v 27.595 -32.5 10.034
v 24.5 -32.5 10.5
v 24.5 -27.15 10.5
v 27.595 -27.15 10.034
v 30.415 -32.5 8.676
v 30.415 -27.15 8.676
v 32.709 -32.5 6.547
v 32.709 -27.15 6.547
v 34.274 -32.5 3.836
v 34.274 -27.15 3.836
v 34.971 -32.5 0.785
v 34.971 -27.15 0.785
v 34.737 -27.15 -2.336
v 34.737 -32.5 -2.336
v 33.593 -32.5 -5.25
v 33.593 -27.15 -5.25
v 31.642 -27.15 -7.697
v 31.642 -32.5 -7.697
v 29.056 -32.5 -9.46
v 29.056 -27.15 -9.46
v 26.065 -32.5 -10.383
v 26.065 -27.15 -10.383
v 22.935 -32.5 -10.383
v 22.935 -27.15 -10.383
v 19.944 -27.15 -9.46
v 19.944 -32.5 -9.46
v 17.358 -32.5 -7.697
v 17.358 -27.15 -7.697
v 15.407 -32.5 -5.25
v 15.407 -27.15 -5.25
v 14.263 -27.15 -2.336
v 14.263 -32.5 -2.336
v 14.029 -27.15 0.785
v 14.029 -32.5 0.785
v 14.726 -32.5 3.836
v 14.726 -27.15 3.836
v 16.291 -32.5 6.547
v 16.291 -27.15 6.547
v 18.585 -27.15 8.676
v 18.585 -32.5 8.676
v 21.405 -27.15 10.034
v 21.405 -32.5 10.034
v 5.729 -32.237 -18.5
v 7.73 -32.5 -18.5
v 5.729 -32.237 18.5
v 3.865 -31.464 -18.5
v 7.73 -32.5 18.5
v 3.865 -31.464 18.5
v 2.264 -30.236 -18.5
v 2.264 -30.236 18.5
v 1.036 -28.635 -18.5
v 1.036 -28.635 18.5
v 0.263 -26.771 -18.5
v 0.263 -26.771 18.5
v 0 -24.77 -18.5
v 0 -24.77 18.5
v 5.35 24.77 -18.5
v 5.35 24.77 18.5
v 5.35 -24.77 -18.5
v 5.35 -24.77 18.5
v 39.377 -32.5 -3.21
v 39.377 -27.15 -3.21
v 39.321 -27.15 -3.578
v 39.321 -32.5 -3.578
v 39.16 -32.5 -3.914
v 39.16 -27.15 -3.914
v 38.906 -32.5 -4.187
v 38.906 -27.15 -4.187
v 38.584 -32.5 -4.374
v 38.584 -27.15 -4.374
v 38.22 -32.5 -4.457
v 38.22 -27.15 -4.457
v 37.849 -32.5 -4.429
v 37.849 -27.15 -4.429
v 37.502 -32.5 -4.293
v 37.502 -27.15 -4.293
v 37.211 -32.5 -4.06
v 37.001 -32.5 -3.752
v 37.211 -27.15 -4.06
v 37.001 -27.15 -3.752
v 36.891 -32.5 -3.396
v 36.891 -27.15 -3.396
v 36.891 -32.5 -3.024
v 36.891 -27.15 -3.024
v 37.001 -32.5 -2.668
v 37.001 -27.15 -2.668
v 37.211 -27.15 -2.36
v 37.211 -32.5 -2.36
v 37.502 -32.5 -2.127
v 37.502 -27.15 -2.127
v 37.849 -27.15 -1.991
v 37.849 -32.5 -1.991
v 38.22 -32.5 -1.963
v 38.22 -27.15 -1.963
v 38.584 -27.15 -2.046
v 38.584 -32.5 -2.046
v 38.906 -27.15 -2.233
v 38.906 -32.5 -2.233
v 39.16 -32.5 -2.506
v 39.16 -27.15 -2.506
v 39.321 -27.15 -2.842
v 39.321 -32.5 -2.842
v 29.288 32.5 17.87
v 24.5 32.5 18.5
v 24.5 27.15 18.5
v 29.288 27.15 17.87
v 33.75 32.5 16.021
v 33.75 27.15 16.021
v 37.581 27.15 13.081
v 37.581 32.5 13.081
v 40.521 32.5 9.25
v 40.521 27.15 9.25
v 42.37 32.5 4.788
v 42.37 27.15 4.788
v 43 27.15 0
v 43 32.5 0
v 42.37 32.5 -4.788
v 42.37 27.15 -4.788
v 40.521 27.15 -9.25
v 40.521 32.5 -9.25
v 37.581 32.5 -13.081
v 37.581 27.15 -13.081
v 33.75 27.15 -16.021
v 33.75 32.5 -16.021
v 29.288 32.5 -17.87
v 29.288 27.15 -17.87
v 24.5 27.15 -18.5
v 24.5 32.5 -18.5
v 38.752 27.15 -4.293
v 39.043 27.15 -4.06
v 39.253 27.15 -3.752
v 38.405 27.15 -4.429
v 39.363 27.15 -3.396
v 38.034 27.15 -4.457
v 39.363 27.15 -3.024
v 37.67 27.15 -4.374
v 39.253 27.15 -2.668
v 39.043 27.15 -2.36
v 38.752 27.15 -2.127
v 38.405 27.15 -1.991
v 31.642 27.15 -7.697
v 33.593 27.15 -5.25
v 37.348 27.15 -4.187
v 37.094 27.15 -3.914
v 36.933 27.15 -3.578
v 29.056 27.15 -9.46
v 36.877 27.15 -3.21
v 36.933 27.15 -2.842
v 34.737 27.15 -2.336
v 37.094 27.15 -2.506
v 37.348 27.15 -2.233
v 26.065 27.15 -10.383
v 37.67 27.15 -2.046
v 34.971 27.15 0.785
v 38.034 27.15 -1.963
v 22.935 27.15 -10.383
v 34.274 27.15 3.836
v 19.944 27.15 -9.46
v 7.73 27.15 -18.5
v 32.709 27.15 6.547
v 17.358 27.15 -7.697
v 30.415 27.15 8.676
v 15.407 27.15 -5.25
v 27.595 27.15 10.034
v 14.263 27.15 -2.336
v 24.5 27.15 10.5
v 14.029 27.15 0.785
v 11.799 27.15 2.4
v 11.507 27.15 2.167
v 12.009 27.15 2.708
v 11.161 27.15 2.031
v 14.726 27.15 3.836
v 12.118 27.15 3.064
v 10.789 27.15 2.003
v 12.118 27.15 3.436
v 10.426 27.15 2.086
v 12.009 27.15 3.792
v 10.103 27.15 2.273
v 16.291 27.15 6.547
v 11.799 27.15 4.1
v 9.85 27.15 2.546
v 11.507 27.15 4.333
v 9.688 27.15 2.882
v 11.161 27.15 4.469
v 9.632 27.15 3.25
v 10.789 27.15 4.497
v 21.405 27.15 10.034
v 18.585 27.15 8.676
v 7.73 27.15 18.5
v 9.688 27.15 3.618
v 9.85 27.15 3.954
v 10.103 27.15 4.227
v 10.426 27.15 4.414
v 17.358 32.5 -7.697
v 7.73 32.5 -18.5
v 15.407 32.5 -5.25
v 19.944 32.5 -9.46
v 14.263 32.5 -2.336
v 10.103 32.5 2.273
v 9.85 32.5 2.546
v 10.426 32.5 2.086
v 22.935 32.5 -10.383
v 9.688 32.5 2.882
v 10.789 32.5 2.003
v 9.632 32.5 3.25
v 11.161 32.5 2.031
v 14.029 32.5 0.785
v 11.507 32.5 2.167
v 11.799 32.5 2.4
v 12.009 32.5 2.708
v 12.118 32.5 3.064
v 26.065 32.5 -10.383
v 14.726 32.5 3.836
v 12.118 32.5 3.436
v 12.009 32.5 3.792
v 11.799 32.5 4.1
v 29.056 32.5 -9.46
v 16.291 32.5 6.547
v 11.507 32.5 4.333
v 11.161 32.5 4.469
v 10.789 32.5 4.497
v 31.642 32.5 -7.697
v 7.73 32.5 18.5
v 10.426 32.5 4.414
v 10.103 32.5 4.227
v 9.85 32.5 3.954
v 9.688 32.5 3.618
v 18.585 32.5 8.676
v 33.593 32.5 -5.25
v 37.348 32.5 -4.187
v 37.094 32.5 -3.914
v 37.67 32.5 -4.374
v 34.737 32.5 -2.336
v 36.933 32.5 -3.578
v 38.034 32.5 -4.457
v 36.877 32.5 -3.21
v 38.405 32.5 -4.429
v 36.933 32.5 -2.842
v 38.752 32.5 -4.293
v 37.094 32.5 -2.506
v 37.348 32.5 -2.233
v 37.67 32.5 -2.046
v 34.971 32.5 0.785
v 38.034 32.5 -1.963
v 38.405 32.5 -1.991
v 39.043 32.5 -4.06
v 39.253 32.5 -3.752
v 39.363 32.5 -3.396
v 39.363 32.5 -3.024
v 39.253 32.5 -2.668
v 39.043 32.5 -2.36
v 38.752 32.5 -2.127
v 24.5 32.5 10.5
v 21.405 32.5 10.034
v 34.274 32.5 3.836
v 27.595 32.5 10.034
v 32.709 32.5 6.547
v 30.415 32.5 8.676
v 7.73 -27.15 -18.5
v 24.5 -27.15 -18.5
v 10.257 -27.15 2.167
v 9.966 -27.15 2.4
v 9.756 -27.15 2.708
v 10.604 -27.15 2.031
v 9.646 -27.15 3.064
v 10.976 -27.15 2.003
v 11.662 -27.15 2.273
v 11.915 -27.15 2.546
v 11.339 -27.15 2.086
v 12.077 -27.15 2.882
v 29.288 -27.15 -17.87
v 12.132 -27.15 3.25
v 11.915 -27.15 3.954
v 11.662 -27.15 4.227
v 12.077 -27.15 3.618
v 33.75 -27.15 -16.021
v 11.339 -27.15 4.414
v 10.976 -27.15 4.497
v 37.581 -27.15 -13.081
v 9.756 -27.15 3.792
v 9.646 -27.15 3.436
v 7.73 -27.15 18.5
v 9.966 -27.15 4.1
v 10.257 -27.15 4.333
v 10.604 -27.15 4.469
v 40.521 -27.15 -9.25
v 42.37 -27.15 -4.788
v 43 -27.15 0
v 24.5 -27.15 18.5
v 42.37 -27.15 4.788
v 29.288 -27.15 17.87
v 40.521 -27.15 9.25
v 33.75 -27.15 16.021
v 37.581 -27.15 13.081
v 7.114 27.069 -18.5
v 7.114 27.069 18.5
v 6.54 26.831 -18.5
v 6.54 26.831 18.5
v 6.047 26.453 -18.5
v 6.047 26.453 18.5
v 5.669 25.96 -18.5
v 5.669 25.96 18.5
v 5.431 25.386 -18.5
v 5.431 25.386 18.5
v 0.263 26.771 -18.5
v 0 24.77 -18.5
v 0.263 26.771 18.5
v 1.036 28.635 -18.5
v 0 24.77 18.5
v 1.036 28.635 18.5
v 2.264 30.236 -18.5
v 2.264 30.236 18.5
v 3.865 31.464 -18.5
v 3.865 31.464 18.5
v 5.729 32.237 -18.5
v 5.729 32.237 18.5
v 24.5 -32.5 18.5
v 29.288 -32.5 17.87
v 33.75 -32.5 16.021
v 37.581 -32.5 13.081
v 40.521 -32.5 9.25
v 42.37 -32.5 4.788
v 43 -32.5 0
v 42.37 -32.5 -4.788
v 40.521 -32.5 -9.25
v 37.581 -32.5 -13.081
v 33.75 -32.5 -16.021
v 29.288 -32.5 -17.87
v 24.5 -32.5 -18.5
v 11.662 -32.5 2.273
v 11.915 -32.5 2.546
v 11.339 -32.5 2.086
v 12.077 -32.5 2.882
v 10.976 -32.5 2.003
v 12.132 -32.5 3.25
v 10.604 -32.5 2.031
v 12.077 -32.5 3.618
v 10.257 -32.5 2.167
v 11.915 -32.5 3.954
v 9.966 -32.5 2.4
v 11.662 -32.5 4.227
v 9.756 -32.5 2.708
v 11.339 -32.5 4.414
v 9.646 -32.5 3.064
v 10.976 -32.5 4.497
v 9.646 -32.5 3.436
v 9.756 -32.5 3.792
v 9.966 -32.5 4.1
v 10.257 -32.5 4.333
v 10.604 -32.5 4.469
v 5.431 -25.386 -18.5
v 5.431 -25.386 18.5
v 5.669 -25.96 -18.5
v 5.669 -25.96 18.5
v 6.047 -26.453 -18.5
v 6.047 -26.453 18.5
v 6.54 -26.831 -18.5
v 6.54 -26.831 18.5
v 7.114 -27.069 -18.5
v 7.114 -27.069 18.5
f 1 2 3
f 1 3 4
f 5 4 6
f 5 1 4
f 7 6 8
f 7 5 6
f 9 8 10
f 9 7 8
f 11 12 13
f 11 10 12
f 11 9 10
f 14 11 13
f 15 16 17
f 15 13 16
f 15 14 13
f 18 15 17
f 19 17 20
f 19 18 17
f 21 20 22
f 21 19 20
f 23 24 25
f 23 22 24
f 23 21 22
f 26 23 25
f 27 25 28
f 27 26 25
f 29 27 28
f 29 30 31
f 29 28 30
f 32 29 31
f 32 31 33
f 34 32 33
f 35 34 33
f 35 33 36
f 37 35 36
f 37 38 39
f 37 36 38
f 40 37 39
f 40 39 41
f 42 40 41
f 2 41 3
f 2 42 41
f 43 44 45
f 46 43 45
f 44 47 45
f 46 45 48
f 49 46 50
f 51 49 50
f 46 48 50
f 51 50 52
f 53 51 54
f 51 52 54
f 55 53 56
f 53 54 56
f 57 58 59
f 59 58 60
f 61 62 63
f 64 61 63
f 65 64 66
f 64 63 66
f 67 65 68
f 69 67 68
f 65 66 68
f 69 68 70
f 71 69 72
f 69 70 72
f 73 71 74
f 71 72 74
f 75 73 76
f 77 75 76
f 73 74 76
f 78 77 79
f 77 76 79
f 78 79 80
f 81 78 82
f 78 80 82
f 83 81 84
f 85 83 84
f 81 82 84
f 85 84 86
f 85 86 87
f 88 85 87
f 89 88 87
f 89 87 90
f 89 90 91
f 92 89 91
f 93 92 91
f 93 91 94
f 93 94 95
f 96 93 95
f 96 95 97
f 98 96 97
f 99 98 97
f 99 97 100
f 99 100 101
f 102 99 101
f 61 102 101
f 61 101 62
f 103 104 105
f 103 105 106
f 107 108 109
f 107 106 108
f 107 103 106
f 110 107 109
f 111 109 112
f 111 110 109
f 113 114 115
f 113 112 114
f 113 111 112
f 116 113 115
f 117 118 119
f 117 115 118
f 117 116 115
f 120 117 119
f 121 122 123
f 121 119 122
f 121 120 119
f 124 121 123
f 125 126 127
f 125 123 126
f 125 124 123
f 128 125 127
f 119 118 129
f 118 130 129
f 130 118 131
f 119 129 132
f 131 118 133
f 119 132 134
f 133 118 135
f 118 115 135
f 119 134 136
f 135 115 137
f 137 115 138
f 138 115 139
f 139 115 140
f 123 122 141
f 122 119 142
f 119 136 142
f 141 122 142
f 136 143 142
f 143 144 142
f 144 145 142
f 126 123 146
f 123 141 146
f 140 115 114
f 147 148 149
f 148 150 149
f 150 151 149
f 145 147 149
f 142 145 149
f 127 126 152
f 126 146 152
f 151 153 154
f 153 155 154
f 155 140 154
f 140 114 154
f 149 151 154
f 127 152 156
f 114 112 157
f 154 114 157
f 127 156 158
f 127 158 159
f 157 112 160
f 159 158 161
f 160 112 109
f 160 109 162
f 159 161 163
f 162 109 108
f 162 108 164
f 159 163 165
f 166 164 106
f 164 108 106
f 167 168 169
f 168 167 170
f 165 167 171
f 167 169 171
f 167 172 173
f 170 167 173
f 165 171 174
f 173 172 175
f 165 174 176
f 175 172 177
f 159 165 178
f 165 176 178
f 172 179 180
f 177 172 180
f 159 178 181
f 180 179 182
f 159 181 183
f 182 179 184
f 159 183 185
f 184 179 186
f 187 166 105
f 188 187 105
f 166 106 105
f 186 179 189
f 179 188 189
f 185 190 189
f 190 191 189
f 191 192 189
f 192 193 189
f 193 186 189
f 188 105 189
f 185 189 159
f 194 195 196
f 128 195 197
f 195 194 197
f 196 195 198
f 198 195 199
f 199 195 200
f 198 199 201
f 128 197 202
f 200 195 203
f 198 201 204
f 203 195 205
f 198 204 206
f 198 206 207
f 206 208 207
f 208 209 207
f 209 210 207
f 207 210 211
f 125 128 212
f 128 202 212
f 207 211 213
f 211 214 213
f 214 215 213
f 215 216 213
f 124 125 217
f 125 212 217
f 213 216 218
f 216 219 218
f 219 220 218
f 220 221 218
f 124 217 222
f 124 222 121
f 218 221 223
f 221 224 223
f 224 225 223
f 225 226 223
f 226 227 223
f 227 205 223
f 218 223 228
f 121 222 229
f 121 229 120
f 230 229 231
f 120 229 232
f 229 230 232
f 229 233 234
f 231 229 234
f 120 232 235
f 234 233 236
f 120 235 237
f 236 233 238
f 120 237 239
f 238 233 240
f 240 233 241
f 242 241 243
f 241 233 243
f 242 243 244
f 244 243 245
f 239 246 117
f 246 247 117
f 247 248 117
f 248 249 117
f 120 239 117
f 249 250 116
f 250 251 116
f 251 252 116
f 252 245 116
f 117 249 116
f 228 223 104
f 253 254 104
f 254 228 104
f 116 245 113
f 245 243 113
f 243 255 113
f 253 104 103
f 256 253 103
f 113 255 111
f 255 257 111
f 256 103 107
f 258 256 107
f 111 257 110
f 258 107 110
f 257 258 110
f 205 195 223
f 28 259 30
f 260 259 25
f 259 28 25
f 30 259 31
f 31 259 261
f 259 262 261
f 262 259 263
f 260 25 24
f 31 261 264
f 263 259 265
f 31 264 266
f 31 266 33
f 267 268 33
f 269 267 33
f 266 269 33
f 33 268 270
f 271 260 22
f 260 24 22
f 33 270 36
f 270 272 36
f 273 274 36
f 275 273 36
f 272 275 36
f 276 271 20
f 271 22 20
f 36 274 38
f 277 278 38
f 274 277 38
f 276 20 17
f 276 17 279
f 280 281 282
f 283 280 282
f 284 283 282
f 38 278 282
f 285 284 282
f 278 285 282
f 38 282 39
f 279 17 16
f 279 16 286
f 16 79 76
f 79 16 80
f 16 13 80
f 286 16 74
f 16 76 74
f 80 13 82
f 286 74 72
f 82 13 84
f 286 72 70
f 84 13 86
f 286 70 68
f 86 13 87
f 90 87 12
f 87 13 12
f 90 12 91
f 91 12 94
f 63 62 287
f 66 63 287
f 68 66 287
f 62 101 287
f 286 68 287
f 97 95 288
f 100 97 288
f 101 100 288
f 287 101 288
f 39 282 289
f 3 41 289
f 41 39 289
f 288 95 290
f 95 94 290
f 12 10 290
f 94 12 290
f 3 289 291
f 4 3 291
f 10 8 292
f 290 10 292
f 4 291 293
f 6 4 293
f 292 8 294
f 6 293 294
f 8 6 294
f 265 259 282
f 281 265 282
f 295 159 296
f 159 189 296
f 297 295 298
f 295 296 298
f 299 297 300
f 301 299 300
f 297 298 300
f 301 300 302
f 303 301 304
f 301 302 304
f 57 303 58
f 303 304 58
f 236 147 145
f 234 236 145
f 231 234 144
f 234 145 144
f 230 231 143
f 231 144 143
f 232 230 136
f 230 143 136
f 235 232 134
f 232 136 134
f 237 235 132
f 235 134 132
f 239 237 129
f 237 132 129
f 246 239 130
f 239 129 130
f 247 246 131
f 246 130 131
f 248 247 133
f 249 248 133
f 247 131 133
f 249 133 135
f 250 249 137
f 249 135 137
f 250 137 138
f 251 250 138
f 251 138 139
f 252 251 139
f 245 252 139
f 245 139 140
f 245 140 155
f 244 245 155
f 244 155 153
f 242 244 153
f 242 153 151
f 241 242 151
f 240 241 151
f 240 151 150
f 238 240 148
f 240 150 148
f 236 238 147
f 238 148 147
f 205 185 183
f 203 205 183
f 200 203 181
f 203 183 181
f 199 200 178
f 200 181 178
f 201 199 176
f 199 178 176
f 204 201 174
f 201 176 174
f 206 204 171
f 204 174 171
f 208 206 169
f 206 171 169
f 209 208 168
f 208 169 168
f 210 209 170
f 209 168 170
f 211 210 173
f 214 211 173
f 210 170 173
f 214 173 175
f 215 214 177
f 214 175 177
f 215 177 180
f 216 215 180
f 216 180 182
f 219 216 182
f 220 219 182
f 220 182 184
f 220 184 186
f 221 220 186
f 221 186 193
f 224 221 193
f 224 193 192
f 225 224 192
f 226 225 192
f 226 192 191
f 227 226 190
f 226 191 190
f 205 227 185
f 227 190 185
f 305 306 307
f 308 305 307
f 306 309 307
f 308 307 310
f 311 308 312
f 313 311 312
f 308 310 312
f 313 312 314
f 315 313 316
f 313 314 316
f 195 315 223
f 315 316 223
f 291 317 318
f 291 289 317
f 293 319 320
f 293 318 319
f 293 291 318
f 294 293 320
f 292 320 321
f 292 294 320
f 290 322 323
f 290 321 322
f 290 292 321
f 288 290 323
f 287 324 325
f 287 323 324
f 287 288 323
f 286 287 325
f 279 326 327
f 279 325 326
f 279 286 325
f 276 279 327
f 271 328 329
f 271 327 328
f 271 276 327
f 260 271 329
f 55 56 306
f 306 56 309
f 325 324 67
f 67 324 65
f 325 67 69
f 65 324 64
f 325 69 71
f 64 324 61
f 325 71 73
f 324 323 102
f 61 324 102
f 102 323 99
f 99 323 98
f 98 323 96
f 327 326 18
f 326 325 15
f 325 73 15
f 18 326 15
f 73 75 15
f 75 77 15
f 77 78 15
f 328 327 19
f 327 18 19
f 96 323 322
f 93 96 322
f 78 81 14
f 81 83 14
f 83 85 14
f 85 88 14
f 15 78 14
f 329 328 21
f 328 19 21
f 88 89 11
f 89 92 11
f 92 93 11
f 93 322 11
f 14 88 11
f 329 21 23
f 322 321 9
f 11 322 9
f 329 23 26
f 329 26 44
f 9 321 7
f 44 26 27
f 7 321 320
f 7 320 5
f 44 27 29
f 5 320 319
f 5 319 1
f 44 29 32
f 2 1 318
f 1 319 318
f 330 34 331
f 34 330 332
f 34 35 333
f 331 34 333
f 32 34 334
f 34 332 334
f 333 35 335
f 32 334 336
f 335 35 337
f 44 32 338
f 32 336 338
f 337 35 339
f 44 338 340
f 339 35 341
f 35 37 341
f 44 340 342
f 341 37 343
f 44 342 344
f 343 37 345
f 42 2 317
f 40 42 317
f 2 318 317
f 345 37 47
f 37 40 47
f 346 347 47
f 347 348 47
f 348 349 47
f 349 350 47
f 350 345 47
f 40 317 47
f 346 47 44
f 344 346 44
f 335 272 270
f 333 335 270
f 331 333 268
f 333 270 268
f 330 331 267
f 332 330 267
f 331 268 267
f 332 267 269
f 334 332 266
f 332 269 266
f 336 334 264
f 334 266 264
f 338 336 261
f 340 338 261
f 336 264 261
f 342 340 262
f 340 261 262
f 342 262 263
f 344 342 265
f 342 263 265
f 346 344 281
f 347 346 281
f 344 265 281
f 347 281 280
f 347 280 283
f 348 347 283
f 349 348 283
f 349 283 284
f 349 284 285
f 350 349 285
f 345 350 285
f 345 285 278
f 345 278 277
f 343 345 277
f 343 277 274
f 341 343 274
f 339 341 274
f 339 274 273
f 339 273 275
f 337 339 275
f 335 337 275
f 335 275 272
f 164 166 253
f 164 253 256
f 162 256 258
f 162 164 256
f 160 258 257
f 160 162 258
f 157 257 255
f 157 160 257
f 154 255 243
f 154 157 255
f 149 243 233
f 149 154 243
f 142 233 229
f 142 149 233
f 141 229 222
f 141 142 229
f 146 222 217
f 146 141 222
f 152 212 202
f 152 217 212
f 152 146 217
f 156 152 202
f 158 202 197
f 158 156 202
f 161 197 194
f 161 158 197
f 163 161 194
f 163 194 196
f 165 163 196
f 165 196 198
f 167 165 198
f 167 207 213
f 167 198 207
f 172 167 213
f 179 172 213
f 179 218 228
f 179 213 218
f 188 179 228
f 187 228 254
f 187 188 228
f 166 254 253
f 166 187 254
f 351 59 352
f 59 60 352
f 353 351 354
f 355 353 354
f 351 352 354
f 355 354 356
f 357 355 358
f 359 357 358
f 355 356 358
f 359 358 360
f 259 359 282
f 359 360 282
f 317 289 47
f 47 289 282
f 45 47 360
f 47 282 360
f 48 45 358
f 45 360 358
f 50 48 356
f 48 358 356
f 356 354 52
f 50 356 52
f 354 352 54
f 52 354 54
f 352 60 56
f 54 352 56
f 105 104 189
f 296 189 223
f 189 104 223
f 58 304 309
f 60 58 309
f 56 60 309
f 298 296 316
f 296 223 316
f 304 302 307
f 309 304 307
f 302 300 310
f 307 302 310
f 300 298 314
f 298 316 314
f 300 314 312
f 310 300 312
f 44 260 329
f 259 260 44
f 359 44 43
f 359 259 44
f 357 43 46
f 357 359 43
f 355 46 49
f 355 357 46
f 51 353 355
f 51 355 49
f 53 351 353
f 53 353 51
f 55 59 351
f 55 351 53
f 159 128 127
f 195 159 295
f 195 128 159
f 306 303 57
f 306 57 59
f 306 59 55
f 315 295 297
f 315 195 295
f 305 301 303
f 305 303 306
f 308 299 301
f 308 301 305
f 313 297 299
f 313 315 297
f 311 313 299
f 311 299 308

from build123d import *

# Parameters (mm, degrees)
BASE_FLANGE1_DEPTH        = 18.5
FILLET3_RADIUS            = 18.5
FILLET3_LENGTH            = 5.35
FILLET4_RADIUS            = 18.5
FILLET4_LENGTH            = 5.35
CUT_EXTRUDE6_DEPTH        = 57.986840586
CUT_EXTRUDE6_DEPTH_BACK   = 57.986840586
SKETCH23_R                = 10.5
M3X0_5_TAPPED_HOLE1_D     = 2.5
M3X0_5_TAPPED_HOLE1_DEPTH = 5.35
M3X0_5_TAPPED_HOLE2_D     = 2.5


# Sheet-metal steps are written as plain solids
with BuildPart() as part:
    # Sketch20 → Base-Flange1 (new, symmetric)
    with BuildSketch(Plane.XY):
        with BuildLine():
            Line((43, -32.5), (7.730000066, -32.5))
            ThreePointArc((7.730000066, -32.5), (2.264064601, -30.235935399), (0, -24.769999934))
            Line((0, -24.769999934), (0, 24.769999934))
            ThreePointArc((0, 24.769999934), (2.264064601, 30.235935399), (7.730000066, 32.5))
            Line((7.730000066, 32.5), (43, 32.5))
            Line((43, 32.5), (43, 27.15))
            Line((43, 27.15), (7.730000066, 27.15))
            ThreePointArc((7.730000066, 27.15), (6.04708588, 26.45291412), (5.35, 24.769999934))
            Line((5.35, 24.769999934), (5.35, -24.769999934))
            ThreePointArc((5.35, -24.769999934), (6.04708588, -26.45291412), (7.730000066, -27.15))
            Line((7.730000066, -27.15), (43, -27.15))
            Line((43, -27.15), (43, -32.5))
        make_face()
    extrude(amount=BASE_FLANGE1_DEPTH, both=True)

    # Fillet3: full round fillet: the end face becomes a half cylinder, R = half its width
    fillet3_face = Plane((43, 29.825, 0), x_dir=(0, 1, 0), z_dir=(1, 0, 0))  # on the end face: x along it, z out of the body
    fillet3_slab = fillet3_face.offset(-FILLET3_RADIUS / 2) * Box(FILLET3_LENGTH, 2 * FILLET3_RADIUS, FILLET3_RADIUS, mode=Mode.PRIVATE)  # the body's end, R deep
    fillet3_round = Plane((24.5, 29.825, 0), x_dir=(1, 0, 0), z_dir=(0, 1, 0)) * Cylinder(FILLET3_RADIUS, FILLET3_LENGTH, mode=Mode.PRIVATE)  # its axis R under the face
    add(fillet3_slab - fillet3_round, mode=Mode.SUBTRACT)

    # Fillet4: full round fillet: the end face becomes a half cylinder, R = half its width
    fillet4_face = Plane((43, -29.825, 0), x_dir=(0, 1, 0), z_dir=(1, 0, 0))  # on the end face: x along it, z out of the body
    fillet4_slab = fillet4_face.offset(-FILLET4_RADIUS / 2) * Box(FILLET4_LENGTH, 2 * FILLET4_RADIUS, FILLET4_RADIUS, mode=Mode.PRIVATE)  # the body's end, R deep
    fillet4_round = Plane((24.5, -29.825, 0), x_dir=(1, 0, 0), z_dir=(0, 1, 0)) * Cylinder(FILLET4_RADIUS, FILLET4_LENGTH, mode=Mode.PRIVATE)  # its axis R under the face
    add(fillet4_slab - fillet4_round, mode=Mode.SUBTRACT)

    # Sketch23 → Cut-Extrude6 (cut, two sides: drawn at the far end of the back side and taken through both)
    with BuildSketch(Plane(origin=(0, 0, 0), x_dir=(1, 0, 0), z_dir=(0, 1, 0)).offset(-CUT_EXTRUDE6_DEPTH_BACK)):
        with Locations(Location((24.5, 0, 0), (0, 0, 270))):
            Circle(SKETCH23_R)
    extrude(amount=CUT_EXTRUDE6_DEPTH + CUT_EXTRUDE6_DEPTH_BACK, mode=Mode.SUBTRACT)

    # M3x0.5 Tapped Hole1
    with Locations(Plane(origin=(0, 32.5, 0), x_dir=(1, 0, 0), z_dir=(0, 1, 0))):
        with Locations((38.127028289, 3.21), (10.882456169, -3.25)):
            Hole(M3X0_5_TAPPED_HOLE1_D / 2, depth=M3X0_5_TAPPED_HOLE1_DEPTH)

    # M3x0.5 Tapped Hole2 (through all)
    with Locations(Plane(origin=(0, -32.5, 0), x_dir=(-1, 0, 0), z_dir=(0, -1, 0))):
        with Locations((-10.882456169, -3.25), (-38.127028289, 3.21)):
            Hole(M3X0_5_TAPPED_HOLE2_D / 2)


solid = part.part
